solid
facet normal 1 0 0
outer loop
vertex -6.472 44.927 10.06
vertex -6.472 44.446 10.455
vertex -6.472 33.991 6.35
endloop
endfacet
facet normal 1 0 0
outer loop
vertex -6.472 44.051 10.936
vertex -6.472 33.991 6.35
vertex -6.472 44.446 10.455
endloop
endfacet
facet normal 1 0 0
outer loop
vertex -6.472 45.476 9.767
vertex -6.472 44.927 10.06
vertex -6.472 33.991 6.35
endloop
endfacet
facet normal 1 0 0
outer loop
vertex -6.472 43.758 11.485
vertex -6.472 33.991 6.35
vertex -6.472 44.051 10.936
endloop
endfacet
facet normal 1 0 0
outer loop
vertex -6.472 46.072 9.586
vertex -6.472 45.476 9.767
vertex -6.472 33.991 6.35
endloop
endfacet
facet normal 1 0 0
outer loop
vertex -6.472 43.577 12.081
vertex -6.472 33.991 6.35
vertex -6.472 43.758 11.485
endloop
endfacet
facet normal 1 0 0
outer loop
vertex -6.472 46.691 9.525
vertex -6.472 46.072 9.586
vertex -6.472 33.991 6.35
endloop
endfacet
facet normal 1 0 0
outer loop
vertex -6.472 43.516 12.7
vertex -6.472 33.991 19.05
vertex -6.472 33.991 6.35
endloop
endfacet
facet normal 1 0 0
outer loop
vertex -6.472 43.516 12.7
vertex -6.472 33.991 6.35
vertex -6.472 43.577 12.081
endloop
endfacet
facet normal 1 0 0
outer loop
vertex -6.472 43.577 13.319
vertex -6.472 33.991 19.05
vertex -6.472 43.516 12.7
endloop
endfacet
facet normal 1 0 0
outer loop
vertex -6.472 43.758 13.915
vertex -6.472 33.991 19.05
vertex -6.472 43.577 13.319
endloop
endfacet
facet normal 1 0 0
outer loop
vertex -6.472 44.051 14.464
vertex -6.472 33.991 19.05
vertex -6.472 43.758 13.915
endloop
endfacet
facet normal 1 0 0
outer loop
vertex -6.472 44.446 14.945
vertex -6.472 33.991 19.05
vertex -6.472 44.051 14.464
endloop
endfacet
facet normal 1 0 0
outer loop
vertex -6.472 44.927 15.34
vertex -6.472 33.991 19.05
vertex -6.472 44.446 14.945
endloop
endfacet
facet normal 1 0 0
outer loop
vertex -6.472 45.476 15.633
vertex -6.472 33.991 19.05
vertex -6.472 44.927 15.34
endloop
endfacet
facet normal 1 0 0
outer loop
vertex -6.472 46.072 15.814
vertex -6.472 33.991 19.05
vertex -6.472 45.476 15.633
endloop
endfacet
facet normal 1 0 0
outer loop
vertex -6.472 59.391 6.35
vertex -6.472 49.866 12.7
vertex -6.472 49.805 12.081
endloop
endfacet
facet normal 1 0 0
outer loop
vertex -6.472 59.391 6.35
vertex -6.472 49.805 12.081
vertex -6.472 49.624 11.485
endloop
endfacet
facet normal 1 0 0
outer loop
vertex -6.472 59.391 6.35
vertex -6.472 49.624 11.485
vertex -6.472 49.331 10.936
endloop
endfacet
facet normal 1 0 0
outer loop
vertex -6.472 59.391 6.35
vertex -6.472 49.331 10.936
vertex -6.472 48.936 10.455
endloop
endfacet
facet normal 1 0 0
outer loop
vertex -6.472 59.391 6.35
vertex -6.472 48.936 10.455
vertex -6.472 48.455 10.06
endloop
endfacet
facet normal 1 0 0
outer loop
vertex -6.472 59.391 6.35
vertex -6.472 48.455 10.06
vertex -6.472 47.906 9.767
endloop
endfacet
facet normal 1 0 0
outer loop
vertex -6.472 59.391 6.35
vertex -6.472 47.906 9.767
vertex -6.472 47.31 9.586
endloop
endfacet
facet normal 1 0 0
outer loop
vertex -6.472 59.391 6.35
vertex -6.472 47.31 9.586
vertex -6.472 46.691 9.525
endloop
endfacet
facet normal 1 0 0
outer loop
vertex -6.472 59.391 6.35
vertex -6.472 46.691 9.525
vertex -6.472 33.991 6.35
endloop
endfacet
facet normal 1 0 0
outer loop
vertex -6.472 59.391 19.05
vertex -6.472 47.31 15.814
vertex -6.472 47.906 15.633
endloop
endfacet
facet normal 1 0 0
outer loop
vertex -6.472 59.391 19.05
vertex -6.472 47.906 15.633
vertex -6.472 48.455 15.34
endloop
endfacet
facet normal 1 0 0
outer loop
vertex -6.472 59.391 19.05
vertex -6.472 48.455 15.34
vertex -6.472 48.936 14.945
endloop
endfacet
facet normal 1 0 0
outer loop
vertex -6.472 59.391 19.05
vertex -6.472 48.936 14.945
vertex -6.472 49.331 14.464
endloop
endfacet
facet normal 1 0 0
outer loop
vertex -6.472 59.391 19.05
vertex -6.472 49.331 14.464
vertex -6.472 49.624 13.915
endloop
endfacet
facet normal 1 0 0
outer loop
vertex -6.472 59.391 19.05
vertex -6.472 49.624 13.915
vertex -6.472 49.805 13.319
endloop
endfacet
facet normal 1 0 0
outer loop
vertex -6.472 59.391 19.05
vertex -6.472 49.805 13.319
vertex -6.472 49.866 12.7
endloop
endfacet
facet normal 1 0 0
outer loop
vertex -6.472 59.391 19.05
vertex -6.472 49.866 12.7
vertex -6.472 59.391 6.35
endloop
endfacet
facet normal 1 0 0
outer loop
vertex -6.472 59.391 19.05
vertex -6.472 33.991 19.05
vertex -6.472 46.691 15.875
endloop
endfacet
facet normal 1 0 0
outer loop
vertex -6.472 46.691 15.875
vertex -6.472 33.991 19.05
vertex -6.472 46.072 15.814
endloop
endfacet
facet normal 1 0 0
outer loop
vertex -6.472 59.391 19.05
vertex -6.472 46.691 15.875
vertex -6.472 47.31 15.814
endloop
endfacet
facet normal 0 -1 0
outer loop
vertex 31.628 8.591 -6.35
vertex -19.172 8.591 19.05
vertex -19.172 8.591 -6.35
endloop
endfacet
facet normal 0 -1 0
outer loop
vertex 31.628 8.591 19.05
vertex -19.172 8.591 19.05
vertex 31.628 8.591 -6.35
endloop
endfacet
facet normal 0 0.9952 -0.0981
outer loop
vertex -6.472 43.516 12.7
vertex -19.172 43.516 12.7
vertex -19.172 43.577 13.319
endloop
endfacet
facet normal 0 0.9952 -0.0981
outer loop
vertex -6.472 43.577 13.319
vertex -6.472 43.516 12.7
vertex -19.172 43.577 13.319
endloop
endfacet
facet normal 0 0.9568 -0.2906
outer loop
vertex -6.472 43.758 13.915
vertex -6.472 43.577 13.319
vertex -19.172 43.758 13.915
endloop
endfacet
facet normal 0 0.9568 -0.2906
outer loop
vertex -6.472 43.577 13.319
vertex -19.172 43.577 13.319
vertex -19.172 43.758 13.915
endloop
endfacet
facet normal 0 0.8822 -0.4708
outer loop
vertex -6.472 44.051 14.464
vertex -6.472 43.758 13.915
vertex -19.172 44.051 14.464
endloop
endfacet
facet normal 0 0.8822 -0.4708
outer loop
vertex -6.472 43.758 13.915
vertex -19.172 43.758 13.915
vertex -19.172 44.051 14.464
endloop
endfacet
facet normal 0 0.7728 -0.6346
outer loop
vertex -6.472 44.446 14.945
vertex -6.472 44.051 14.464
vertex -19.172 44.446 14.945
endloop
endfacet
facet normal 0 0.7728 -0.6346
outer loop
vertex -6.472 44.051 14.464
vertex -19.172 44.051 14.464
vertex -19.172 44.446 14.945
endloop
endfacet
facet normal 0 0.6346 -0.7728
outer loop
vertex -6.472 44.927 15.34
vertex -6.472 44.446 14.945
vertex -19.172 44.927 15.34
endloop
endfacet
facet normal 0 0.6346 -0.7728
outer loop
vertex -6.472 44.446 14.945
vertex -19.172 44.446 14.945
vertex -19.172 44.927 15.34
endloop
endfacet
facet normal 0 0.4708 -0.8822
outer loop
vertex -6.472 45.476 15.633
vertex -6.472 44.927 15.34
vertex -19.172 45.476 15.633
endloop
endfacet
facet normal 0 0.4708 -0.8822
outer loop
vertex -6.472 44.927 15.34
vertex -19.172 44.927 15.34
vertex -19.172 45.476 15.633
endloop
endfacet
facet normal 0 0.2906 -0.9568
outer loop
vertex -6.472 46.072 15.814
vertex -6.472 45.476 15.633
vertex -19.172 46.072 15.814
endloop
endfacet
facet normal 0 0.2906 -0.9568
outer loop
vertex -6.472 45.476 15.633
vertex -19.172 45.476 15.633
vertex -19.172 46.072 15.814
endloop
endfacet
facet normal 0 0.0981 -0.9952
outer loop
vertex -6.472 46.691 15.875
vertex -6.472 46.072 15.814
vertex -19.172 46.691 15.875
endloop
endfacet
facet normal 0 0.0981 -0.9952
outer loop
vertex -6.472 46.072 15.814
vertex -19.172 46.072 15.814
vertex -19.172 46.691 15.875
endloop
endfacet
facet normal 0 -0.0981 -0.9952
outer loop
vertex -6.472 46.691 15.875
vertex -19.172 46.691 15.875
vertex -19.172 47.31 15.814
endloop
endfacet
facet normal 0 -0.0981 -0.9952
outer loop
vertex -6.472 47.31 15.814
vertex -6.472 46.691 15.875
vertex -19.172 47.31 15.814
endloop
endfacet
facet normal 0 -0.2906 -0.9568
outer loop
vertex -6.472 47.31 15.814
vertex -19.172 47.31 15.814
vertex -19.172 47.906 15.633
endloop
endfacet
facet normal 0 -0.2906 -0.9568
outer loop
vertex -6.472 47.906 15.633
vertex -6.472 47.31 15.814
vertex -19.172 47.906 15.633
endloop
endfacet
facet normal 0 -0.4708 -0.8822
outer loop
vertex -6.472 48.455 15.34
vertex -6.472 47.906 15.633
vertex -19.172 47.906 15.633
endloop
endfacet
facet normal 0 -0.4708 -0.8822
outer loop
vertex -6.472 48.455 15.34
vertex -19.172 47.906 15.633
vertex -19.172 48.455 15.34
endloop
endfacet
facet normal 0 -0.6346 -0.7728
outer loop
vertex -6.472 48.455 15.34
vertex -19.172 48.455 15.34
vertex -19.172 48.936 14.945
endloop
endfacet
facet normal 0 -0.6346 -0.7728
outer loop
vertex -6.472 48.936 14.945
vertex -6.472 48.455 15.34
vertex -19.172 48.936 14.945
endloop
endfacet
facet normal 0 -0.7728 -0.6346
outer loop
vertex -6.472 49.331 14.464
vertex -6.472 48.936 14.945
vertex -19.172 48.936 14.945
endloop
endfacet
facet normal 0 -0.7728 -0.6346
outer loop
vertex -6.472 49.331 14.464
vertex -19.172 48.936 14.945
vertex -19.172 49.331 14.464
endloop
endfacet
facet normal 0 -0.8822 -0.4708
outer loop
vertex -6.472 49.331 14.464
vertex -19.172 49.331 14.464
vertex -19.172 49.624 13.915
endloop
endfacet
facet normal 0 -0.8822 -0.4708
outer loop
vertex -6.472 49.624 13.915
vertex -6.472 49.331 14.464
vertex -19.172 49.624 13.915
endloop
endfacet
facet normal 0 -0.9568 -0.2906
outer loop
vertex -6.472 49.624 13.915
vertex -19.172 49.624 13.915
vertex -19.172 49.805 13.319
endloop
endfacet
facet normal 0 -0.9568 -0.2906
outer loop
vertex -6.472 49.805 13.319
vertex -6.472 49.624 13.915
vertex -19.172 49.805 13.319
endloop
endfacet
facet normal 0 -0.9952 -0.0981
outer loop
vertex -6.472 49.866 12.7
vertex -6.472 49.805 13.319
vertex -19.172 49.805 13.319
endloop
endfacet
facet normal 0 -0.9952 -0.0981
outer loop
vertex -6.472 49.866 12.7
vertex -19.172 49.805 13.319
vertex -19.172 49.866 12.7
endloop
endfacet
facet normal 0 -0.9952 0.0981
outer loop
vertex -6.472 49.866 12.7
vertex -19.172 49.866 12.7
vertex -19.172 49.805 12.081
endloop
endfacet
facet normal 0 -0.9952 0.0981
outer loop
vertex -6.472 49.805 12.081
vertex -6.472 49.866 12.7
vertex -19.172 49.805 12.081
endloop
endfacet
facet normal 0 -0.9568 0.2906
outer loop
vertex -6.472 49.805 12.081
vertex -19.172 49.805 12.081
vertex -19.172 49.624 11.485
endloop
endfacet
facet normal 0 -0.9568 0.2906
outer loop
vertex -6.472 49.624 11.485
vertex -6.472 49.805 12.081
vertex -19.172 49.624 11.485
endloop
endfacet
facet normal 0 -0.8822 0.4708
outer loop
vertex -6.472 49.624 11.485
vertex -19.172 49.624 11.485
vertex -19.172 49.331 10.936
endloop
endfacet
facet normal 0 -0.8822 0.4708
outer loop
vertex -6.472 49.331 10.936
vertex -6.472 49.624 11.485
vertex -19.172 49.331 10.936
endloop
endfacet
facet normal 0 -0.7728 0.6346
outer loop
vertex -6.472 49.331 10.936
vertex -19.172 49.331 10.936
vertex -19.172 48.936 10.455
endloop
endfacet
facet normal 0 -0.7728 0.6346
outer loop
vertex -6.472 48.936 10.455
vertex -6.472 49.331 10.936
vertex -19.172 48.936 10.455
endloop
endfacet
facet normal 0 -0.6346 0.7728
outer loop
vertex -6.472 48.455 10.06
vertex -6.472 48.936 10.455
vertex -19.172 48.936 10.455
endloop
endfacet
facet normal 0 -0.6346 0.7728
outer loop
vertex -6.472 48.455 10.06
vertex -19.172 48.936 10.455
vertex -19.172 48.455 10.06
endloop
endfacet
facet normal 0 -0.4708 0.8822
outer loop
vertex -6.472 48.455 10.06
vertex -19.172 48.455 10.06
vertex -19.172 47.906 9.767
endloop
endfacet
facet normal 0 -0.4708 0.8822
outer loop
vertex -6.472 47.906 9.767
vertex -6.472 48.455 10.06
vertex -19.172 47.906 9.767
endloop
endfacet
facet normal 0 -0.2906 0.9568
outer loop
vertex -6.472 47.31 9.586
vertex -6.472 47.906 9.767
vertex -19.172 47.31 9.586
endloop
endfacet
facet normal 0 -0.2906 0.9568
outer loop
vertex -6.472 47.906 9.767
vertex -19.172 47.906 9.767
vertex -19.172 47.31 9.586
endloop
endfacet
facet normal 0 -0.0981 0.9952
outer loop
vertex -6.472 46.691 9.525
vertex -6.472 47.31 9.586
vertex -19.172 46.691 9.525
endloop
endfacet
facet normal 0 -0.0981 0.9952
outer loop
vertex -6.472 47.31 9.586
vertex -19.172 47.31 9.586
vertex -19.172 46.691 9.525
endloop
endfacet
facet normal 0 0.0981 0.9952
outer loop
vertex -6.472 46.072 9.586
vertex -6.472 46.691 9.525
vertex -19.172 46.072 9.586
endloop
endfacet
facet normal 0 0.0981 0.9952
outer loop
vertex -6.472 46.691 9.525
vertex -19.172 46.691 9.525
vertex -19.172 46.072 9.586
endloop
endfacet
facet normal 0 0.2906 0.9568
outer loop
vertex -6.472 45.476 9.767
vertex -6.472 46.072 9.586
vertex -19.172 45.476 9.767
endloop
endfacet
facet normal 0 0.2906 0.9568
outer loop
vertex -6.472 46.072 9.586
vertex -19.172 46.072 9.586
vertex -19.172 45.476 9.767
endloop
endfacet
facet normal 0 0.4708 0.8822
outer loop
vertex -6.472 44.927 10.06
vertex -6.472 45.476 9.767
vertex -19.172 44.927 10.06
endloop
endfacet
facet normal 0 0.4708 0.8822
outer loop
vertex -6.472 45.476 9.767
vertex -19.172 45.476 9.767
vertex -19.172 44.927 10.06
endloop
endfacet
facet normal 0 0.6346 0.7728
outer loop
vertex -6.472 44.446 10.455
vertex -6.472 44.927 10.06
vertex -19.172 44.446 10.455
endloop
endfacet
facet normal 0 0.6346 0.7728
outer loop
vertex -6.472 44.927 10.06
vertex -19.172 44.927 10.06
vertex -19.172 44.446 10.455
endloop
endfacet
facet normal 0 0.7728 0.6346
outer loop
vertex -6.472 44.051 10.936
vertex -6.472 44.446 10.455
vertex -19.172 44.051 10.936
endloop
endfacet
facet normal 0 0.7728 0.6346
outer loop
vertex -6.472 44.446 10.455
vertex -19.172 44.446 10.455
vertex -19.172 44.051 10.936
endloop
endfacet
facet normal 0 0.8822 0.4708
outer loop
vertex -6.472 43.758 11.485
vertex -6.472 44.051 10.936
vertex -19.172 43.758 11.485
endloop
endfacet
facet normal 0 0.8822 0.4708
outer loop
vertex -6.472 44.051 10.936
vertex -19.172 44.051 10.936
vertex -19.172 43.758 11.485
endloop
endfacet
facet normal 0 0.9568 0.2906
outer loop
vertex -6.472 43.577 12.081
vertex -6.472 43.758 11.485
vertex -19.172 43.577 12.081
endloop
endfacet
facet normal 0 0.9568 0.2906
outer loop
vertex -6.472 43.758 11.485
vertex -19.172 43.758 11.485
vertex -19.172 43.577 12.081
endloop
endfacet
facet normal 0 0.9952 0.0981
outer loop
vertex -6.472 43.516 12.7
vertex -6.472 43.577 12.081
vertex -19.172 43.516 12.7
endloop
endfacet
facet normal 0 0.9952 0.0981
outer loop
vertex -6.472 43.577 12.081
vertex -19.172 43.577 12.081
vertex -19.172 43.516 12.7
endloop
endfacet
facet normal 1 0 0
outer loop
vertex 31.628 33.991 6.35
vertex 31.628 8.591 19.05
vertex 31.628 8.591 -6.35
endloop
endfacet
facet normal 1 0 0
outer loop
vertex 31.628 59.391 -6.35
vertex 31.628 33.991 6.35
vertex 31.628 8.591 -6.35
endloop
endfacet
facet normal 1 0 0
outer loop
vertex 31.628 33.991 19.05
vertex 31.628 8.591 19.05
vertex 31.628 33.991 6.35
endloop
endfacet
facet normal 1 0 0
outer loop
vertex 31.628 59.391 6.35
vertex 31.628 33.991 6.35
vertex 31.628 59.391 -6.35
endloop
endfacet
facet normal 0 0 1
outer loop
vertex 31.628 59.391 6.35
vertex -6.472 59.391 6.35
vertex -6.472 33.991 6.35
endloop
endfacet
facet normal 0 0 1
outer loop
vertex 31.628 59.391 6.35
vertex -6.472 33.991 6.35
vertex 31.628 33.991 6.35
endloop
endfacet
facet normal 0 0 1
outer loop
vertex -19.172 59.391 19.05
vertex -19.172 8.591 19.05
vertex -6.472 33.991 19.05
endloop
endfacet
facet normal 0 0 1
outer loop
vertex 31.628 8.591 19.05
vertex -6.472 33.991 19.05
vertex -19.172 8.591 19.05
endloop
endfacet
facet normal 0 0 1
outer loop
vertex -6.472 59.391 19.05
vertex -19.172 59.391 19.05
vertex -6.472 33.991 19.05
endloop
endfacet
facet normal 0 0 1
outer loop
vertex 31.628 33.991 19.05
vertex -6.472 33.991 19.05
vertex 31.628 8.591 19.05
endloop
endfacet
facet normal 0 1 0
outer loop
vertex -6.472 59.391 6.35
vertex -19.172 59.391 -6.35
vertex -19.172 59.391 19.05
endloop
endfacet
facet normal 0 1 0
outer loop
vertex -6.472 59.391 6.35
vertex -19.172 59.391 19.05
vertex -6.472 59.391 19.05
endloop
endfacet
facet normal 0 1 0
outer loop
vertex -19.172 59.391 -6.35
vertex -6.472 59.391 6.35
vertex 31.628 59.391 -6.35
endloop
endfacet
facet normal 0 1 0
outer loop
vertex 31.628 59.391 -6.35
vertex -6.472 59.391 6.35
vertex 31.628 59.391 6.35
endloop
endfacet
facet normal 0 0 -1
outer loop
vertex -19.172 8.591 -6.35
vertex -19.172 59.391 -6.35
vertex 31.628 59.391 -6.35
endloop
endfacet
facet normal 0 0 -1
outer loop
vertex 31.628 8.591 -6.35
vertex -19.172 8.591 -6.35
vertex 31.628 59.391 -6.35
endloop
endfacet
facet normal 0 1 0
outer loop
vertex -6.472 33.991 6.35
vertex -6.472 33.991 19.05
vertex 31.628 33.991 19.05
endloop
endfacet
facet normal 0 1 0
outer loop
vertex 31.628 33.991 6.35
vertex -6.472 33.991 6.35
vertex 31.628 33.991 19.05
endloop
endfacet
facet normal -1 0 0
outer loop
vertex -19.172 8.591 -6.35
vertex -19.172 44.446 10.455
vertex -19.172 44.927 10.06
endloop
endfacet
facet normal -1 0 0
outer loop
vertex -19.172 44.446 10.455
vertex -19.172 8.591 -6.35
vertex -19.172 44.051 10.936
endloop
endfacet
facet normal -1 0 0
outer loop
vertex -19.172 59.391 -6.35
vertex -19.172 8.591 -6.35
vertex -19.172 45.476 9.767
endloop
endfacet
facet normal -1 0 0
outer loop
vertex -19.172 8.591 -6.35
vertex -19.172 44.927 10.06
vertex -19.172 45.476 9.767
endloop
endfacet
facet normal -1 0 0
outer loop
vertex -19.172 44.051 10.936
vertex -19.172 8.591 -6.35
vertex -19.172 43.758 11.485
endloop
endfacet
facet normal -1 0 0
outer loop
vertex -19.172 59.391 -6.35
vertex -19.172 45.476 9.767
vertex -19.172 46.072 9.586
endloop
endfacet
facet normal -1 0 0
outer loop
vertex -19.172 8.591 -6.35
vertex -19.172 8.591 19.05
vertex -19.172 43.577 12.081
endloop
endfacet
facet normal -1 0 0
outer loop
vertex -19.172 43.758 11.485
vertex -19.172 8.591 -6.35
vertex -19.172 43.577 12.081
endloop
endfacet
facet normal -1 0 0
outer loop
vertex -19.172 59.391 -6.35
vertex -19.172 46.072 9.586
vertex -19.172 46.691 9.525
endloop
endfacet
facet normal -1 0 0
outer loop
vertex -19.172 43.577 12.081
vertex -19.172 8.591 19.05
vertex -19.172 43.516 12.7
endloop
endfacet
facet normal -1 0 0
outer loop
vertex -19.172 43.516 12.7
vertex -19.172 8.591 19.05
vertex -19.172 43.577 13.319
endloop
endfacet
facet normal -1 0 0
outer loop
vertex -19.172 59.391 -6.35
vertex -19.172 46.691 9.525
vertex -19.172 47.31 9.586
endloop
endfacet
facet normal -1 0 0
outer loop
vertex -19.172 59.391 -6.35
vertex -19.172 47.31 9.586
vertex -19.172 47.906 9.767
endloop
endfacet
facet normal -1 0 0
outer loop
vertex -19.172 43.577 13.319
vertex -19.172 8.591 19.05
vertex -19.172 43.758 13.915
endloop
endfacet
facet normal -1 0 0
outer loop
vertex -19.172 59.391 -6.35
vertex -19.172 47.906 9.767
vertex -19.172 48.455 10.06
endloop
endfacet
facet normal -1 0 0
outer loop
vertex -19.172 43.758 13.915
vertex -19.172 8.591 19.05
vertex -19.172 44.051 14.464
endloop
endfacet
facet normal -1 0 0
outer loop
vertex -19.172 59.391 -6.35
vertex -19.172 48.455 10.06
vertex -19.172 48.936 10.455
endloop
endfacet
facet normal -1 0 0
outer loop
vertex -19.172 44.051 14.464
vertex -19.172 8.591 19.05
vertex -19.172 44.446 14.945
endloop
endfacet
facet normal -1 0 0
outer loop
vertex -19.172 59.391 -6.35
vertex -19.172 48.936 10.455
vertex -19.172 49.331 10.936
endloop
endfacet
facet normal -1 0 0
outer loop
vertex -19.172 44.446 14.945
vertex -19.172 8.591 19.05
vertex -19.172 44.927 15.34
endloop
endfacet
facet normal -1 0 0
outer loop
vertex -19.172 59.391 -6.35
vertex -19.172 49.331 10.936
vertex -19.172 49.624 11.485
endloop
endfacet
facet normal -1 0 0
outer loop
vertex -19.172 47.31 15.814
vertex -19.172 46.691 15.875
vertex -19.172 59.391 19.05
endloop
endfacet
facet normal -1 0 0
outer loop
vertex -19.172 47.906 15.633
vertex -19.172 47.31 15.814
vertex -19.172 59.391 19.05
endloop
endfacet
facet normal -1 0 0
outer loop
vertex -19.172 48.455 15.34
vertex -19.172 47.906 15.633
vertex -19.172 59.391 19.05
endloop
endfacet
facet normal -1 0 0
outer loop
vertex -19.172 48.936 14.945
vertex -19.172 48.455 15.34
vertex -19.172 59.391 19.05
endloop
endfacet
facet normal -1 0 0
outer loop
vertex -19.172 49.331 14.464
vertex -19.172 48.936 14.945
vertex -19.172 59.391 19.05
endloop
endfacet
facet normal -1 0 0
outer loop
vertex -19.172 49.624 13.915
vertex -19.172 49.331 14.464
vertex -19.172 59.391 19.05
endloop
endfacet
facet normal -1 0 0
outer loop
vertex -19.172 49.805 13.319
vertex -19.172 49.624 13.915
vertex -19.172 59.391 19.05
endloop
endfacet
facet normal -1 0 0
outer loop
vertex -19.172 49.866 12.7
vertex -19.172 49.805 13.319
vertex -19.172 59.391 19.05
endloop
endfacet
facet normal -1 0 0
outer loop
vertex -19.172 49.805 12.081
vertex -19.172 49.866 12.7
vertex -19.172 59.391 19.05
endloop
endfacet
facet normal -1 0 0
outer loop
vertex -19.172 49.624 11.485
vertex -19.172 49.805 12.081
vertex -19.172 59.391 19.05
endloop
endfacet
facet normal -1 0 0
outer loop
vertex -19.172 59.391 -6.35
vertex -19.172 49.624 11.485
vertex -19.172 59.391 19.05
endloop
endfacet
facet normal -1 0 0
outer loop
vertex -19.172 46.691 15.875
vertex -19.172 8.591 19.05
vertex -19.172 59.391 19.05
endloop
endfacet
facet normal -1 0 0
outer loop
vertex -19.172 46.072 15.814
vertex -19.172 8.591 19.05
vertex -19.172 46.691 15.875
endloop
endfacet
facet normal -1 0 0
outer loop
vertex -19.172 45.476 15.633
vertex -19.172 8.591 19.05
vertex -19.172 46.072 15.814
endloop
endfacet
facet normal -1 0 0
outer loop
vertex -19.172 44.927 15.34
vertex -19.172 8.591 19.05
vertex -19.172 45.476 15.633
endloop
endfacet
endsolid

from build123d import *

# Parameters (mm, degrees)
F0_W     = 50.8
F0_H     = 50.8
F1_DEPTH = 6.35
F2_W     = 50.8
F2_H     = 25.4
F3_DEPTH = 12.7
F4_W     = 12.7
F4_H     = 25.4
F5_DEPTH = 12.7
F7_D     = 6.35


with BuildPart() as f1:
    # F0 (on Top) → F1 (new body, symmetric)
    with BuildSketch(Plane.XY):
        with Locations((6.228447, 33.990965)):
            Rectangle(F0_W, F0_H)
    extrude(amount=F1_DEPTH, both=True)

    # F2 (on face) → F3 (join, symmetric)
    with BuildSketch(Plane.XY.offset(6.35)):
        with Locations((6.228447, 21.290965)):
            Rectangle(F2_W, F2_H)
    extrude(amount=F3_DEPTH, both=True)

    # F4 (on face) → F5 (join, symmetric)
    with BuildSketch(Plane.XY.offset(6.35)):
        with Locations((-12.821553, 46.690965)):
            Rectangle(F4_W, F4_H)
    extrude(amount=F5_DEPTH, both=True)

    # F7 (through all)
    with Locations(Plane.YZ.offset(-6.471553)):
        with Locations((46.690965, 12.7)):
            Hole(F7_D / 2)


solid = f1.part
